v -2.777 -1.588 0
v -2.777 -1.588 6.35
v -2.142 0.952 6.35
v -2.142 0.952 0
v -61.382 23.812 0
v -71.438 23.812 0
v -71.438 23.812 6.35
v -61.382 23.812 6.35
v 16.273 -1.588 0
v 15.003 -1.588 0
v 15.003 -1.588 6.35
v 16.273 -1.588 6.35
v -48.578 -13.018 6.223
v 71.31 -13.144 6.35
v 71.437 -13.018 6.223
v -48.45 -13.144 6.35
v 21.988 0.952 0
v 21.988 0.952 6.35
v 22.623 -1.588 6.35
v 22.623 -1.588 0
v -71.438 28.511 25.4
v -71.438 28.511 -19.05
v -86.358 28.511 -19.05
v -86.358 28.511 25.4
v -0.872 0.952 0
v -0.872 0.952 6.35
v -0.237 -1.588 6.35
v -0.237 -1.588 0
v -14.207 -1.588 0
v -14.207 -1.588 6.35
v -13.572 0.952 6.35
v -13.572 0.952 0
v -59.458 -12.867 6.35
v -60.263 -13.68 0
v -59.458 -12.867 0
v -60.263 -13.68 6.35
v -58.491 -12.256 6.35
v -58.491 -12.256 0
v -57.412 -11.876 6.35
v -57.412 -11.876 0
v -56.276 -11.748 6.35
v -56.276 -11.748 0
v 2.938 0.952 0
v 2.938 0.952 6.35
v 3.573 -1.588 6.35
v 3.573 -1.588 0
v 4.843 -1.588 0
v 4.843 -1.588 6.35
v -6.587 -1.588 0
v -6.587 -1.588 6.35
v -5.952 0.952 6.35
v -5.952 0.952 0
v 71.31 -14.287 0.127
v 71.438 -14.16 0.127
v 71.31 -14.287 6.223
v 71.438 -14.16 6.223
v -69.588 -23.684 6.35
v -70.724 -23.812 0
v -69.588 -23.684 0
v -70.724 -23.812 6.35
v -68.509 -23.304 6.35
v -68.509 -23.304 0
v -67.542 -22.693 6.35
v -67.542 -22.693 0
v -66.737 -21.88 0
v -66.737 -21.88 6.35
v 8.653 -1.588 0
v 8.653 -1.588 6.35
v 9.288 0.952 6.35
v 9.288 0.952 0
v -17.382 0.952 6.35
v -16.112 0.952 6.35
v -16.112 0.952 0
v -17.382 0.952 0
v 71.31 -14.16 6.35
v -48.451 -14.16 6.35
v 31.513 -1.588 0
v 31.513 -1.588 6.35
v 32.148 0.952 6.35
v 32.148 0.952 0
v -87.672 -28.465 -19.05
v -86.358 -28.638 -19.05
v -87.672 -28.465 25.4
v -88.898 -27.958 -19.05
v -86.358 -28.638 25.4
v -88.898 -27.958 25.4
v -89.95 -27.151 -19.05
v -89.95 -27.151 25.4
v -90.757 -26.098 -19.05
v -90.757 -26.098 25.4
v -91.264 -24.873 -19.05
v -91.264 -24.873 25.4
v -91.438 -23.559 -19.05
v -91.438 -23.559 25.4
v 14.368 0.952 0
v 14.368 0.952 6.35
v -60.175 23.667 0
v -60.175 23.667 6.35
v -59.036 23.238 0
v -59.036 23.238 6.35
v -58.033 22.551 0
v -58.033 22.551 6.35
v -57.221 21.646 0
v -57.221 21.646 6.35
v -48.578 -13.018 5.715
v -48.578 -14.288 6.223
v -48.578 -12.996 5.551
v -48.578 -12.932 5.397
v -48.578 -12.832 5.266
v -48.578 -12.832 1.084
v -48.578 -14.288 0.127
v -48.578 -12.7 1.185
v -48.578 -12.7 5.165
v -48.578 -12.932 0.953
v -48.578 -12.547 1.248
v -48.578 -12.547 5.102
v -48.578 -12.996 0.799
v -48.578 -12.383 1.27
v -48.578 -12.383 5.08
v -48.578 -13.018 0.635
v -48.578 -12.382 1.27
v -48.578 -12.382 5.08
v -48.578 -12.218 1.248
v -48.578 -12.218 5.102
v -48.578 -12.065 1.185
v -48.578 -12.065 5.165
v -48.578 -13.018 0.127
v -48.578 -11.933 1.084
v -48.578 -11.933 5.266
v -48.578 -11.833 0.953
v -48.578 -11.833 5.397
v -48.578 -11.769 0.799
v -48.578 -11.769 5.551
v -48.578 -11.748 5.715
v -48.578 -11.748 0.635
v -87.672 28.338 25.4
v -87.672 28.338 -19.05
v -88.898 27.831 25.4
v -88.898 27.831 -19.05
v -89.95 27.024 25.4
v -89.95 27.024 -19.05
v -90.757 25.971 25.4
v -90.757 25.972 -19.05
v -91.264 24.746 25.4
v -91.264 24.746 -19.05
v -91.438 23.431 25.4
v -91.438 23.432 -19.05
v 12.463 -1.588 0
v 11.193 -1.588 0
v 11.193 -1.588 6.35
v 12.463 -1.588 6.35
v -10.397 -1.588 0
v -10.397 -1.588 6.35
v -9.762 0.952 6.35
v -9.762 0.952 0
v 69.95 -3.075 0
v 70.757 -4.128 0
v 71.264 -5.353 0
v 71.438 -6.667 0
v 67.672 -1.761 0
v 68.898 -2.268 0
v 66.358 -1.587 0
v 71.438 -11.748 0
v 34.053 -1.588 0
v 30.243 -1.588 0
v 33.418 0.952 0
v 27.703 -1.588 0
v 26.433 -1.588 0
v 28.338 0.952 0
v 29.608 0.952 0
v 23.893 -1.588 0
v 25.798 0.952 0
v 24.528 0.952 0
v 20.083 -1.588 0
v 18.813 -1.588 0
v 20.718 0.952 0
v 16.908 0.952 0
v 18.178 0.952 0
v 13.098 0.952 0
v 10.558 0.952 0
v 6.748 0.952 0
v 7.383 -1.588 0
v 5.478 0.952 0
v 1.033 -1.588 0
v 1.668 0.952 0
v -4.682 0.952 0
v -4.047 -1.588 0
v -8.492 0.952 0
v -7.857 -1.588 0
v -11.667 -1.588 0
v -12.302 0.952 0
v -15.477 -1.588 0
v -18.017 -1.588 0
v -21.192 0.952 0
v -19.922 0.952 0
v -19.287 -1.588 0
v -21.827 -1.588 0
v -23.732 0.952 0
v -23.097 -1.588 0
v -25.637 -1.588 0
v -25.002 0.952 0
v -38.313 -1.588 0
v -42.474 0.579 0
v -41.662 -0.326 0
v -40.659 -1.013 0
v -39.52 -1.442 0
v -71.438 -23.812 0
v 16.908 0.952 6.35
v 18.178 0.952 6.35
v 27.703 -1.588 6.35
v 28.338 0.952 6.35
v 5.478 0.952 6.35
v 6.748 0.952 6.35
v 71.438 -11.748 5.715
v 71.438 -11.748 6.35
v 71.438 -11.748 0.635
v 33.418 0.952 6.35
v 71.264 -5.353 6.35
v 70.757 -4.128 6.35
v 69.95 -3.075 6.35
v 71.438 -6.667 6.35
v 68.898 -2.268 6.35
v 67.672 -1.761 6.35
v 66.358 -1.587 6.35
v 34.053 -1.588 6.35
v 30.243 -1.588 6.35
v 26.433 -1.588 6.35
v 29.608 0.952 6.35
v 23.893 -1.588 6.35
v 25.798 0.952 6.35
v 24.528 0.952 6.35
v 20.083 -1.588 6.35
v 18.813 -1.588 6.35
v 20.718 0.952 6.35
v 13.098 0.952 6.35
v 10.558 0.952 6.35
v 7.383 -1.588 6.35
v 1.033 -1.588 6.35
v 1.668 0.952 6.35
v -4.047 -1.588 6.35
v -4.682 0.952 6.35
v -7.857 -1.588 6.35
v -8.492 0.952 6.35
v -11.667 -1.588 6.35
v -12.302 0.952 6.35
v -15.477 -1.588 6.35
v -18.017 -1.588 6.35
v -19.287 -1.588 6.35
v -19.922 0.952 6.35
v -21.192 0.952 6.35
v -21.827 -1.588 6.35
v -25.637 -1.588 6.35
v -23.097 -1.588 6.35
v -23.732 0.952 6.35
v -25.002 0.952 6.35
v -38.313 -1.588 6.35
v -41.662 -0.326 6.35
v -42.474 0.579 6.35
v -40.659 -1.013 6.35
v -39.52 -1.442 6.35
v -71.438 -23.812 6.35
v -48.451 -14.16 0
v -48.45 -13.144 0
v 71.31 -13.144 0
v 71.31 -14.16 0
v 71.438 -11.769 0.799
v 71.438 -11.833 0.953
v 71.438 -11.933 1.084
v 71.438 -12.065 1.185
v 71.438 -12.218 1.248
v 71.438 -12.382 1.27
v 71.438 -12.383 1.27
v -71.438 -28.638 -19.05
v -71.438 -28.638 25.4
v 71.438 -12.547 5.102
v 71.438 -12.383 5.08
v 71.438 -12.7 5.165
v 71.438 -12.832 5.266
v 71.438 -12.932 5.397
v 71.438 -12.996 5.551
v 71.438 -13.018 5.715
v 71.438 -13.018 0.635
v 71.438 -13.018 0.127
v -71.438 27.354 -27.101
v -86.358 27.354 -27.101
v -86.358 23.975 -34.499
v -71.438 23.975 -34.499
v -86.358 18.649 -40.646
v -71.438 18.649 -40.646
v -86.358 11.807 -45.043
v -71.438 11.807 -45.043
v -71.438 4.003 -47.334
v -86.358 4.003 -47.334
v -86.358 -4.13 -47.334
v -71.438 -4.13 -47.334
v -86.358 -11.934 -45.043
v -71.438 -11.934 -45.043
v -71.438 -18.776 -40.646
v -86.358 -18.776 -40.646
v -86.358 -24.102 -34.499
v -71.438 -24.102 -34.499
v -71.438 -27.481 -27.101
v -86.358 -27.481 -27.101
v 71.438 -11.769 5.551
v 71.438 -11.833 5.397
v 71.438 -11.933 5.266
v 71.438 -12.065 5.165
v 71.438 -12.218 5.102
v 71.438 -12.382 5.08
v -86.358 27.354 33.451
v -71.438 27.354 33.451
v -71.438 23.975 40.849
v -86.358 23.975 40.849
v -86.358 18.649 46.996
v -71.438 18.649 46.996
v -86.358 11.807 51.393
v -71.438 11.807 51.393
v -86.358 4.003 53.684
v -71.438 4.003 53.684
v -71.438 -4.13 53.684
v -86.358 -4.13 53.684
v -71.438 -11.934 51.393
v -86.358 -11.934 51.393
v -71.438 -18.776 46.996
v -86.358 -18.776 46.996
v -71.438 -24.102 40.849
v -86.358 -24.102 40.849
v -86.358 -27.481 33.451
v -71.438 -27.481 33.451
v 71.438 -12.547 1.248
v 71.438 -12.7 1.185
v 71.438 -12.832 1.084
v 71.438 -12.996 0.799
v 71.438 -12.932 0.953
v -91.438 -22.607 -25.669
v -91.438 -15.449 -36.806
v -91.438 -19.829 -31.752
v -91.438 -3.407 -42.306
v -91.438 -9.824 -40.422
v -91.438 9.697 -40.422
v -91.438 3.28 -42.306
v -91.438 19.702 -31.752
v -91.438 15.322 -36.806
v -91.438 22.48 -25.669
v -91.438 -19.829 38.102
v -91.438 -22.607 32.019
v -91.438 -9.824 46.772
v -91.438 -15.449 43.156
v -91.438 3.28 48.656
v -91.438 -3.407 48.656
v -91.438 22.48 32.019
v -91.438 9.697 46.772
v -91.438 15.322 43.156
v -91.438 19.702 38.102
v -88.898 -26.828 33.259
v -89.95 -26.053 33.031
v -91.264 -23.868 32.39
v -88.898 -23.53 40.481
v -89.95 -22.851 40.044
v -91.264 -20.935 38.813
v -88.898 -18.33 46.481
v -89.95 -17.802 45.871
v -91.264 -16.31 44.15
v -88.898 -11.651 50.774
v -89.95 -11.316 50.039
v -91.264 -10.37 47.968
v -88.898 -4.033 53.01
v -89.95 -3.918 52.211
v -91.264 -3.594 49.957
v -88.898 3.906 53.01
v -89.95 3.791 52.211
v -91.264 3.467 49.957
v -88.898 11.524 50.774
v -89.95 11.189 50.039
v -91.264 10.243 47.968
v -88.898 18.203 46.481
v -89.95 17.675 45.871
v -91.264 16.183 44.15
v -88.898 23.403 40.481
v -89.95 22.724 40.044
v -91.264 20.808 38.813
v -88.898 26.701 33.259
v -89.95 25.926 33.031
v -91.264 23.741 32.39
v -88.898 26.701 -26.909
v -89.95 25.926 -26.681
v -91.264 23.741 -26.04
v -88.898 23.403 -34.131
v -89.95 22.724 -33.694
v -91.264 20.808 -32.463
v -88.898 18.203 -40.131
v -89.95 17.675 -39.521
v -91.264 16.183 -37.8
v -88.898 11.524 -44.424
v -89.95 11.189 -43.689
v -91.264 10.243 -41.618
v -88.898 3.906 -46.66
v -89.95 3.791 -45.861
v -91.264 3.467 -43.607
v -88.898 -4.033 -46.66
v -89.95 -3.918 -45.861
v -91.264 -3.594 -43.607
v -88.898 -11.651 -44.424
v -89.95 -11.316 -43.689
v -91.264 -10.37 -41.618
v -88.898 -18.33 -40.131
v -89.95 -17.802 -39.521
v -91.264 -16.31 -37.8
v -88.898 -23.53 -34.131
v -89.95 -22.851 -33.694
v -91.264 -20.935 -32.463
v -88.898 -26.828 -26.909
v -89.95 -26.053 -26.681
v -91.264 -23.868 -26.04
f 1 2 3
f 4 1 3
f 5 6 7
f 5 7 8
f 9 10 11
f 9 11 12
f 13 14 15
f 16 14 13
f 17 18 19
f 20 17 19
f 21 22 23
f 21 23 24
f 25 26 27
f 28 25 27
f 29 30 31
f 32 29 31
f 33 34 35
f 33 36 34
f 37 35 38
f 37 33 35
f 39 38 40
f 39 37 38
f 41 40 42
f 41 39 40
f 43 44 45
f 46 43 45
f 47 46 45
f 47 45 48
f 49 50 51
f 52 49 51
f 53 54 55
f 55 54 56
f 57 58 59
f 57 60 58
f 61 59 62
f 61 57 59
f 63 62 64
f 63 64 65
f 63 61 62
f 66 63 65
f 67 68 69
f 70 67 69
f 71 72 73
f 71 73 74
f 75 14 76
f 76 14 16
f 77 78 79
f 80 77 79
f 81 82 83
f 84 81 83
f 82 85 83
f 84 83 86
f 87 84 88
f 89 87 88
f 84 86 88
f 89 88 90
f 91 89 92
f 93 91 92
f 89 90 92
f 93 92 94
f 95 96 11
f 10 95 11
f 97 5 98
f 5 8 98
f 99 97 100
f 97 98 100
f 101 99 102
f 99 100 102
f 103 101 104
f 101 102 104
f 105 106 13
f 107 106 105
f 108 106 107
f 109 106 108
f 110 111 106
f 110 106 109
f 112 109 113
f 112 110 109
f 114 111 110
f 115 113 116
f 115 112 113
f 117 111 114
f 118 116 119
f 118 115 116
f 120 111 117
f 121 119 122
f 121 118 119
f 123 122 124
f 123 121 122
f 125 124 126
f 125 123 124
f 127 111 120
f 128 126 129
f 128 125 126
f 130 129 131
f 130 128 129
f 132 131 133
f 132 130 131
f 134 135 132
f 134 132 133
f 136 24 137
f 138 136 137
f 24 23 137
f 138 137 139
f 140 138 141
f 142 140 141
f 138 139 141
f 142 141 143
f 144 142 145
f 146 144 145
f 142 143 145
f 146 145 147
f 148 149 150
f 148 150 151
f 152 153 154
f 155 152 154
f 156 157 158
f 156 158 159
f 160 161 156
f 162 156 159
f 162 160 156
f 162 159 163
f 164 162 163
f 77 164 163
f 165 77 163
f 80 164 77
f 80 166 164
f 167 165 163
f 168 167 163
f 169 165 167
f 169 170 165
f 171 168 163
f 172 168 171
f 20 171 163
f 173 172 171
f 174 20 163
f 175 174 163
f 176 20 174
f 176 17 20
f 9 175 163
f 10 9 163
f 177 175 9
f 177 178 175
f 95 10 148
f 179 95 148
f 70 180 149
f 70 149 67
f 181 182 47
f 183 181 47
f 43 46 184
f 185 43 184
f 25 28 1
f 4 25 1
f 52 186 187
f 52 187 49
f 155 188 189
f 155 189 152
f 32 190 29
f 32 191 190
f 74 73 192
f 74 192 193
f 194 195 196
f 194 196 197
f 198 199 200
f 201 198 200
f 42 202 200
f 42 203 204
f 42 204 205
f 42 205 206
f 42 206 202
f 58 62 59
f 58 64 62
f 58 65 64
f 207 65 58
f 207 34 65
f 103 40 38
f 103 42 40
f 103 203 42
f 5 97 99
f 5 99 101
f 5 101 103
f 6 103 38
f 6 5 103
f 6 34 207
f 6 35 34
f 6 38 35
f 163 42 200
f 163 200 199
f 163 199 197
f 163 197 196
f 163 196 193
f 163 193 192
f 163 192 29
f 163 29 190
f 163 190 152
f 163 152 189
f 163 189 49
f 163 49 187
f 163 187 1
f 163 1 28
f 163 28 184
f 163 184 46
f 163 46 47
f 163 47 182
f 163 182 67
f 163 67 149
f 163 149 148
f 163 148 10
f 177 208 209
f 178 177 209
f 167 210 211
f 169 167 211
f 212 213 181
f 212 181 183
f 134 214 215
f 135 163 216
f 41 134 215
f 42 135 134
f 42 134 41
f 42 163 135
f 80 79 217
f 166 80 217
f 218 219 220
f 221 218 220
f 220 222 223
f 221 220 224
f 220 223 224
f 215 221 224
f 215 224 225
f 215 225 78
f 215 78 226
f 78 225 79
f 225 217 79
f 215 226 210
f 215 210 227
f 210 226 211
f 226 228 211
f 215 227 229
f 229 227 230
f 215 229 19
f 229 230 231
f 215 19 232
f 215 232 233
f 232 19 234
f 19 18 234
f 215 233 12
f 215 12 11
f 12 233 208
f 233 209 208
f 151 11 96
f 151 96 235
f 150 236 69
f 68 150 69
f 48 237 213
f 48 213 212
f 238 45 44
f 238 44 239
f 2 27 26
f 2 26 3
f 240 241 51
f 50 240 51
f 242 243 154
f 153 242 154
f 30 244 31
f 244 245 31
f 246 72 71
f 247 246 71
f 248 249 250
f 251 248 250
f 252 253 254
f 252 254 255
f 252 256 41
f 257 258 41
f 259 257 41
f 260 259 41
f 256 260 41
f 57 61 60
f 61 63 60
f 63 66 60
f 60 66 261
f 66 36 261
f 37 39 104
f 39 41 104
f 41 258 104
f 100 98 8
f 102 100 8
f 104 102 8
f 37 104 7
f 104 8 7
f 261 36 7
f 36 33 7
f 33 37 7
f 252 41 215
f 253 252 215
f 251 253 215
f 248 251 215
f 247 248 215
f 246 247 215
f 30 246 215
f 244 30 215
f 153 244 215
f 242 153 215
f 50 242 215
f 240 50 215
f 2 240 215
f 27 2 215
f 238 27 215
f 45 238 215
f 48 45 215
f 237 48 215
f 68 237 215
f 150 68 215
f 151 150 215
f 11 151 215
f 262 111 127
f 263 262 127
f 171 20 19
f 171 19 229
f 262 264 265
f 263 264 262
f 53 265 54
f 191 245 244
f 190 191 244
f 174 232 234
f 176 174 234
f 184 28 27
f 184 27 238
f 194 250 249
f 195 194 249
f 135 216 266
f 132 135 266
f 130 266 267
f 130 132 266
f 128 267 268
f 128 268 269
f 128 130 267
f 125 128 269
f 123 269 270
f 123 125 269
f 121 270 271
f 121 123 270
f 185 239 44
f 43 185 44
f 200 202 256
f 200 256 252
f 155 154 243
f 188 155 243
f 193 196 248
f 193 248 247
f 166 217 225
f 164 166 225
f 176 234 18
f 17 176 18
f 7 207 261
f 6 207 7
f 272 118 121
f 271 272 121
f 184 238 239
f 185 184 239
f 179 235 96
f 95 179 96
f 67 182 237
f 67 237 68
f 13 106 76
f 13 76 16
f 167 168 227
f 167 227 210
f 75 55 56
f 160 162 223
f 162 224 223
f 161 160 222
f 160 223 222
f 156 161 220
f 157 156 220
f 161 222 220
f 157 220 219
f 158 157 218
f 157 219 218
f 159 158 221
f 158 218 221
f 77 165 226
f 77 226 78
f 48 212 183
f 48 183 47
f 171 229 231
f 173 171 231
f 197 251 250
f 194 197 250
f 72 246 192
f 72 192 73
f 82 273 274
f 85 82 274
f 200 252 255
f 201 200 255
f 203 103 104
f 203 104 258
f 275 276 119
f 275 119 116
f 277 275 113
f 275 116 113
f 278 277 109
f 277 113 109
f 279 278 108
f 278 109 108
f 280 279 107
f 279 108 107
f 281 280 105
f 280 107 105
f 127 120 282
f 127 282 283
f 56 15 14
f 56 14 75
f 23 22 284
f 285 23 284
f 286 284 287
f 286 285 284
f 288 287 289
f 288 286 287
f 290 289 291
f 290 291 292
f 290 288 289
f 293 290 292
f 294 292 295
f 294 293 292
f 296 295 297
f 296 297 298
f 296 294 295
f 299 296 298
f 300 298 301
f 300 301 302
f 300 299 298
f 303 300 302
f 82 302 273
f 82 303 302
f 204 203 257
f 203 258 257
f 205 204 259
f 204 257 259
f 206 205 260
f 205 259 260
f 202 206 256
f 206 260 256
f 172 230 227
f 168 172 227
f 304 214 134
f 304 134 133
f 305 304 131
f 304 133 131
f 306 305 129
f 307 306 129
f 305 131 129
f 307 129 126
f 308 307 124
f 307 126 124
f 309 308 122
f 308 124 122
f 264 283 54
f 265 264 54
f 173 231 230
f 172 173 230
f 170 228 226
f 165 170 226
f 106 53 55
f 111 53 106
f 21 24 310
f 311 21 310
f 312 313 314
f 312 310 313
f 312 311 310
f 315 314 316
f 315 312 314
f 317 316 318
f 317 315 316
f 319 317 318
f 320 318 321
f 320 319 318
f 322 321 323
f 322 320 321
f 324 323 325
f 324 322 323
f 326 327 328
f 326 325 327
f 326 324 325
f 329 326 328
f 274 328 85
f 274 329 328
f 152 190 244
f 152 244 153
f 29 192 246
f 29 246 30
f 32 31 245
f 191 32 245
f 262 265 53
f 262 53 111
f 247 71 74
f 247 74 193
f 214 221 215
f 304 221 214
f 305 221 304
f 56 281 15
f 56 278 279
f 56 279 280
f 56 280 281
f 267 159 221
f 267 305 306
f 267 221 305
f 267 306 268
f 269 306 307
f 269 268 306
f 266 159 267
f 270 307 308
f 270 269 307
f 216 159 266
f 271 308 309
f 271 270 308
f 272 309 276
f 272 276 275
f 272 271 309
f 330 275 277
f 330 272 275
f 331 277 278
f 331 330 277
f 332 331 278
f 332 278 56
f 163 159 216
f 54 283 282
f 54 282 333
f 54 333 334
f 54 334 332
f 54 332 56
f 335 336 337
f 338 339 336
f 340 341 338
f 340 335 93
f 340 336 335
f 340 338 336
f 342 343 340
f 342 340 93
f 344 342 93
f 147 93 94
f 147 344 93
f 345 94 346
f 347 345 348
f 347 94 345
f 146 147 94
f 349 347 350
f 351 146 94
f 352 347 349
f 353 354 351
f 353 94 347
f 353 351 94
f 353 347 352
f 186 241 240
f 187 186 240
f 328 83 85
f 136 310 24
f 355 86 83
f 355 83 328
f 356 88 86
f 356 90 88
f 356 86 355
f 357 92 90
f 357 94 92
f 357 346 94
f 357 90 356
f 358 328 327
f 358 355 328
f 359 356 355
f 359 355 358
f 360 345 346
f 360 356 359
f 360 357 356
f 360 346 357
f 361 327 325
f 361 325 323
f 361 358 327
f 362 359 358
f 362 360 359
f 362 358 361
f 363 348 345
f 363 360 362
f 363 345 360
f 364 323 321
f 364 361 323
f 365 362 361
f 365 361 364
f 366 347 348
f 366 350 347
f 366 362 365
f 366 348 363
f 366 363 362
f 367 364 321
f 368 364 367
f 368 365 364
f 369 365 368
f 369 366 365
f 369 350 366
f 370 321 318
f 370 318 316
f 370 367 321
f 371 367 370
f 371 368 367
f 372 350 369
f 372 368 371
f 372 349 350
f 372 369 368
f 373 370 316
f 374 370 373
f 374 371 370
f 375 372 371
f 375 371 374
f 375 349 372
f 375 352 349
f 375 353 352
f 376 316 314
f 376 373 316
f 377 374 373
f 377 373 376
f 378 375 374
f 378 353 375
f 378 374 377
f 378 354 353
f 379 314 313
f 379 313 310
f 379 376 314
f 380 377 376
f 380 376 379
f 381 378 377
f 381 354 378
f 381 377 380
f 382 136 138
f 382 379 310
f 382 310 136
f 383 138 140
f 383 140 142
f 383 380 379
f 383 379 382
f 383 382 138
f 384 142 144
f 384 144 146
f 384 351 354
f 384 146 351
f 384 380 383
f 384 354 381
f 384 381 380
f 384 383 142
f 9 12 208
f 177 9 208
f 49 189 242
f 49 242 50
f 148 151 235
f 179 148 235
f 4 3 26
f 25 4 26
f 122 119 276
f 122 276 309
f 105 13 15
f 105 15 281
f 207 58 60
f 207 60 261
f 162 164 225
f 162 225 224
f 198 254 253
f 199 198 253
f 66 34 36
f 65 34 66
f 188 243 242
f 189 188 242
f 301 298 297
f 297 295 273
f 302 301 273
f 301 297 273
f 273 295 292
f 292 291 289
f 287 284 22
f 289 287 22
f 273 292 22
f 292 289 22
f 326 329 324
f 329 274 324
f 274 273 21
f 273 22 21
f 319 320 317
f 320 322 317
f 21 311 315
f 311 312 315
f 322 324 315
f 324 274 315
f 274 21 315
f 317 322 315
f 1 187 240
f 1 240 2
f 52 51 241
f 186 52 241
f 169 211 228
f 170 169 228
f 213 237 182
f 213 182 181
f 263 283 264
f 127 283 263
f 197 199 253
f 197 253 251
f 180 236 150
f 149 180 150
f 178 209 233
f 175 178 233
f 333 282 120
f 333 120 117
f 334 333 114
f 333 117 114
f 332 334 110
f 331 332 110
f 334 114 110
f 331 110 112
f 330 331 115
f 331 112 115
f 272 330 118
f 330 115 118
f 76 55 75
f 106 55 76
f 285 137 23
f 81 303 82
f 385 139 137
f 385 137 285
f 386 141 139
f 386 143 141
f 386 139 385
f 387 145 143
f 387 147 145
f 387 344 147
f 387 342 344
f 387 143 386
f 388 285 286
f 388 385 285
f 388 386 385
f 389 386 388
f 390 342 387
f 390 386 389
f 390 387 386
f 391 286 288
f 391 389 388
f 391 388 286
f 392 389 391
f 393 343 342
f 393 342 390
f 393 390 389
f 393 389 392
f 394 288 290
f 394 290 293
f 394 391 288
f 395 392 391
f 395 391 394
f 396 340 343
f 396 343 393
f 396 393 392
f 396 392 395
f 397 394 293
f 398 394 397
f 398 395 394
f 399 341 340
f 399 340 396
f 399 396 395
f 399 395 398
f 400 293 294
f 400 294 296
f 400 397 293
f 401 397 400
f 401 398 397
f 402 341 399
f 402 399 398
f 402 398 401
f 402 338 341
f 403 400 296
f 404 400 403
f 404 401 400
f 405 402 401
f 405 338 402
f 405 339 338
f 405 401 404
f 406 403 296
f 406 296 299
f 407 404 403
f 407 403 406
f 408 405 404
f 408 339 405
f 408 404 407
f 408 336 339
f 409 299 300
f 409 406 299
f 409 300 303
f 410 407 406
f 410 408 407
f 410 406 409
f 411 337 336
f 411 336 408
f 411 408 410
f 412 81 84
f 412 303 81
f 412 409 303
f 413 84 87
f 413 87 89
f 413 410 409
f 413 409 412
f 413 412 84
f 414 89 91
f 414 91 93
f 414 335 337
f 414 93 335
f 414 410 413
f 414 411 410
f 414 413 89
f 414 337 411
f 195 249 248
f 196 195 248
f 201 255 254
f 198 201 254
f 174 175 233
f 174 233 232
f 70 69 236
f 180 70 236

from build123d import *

# Parameters (mm, degrees)
BOSS_EXTRUDE1_DEPTH = 6.35
FILLET1_R           = 5.08
FILLET2_R           = 5.08
FILLET3_R           = 5.08
SKETCH2_W           = 1.27
SKETCH2_H           = 1.27
CUT_EXTRUDE1_DEPTH  = 120.015
FILLET5_R           = 0.635
FILLET6_R           = 0.635
CHAMFER1_SIZE       = 0.127
BOSS_EXTRUDE2_DEPTH = 6.35
SKETCH4_W           = 101.6
SKETCH4_H           = 57.15
BOSS_EXTRUDE3_DEPTH = 20
FILLET7_RADIUS      = 28.575
FILLET7_LENGTH      = 20
FILLET8_RADIUS      = 28.575
FILLET8_LENGTH      = 20
FILLET9_R           = 5.08


with BuildPart() as part:
    # Sketch1 → Boss-Extrude1 (new body)
    with BuildSketch(Plane.XY):
        Polygon((-71.4375, 23.8125), (-58.7375, 23.8125), (-40.9575, -1.5875), (71.4375, -1.5875), (71.4375, -14.2875), (-48.5775, -14.2875), (-48.5775, -11.7475), (-58.7375, -11.7475), (-68.2625, -23.8125), (-71.4375, -23.8125), align=None)
    extrude(amount=BOSS_EXTRUDE1_DEPTH)

    # Fillet1
    fillet1_edges = [part.edges().sort_by_distance(p)[0] for p in [
        (-58.7375, 23.8125, 3.175),
    ]]
    fillet(fillet1_edges, radius=FILLET1_R)

    # Fillet2
    fillet2_edges = [part.edges().sort_by_distance(p)[0] for p in [
        (-40.9575, -1.5875, 3.175),
        (-58.7375, -11.7475, 3.175),
        (-68.2625, -23.8125, 3.175),
    ]]
    fillet(fillet2_edges, radius=FILLET2_R)

    # Fillet3
    fillet3_edges = [part.edges().sort_by_distance(p)[0] for p in [
        (71.4375, -1.5875, 3.175),
    ]]
    fillet(fillet3_edges, radius=FILLET3_R)

    # Sketch2 → Cut-Extrude1 (cut)
    with BuildSketch(Plane(origin=(71.4375, 0, 0), x_dir=(0, 0, -1), z_dir=(1, 0, 0))):
        with Locations((-5.715, -12.3825)):
            Rectangle(SKETCH2_W, SKETCH2_H)
        with Locations((-0.635, -12.3825)):
            Rectangle(SKETCH2_W, SKETCH2_H)
    extrude(amount=-CUT_EXTRUDE1_DEPTH, mode=Mode.SUBTRACT)

    # Fillet5
    fillet5_edges = [part.edges().sort_by_distance(p)[0] for p in [
        (11.43, -11.7475, 1.27),
        (11.43, -13.0175, 1.27),
    ]]
    fillet(fillet5_edges, radius=FILLET5_R - 0.0001)  # a hair under: the kernel refuses the full size

    # Fillet6
    fillet6_edges = [part.edges().sort_by_distance(p)[0] for p in [
        (11.43, -11.7475, 5.08),
        (11.43, -13.0175, 5.08),
    ]]
    fillet(fillet6_edges, radius=FILLET6_R - 0.0001)  # a hair under: the kernel refuses the full size

    # Chamfer1
    chamfer1_edges = [part.edges().sort_by_distance(p)[0] for p in [
        (71.4375, -13.6525, 0),
        (11.43, -14.2875, 0),
        (71.4375, -14.2875, 3.175),
        (11.43, -14.2875, 6.35),
        (71.4375, -13.6525, 6.35),
        (-48.5775, -13.6525, 0),
        (-48.5775, -13.6525, 6.35),
        (11.43, -13.0175, 6.35),
        (11.43, -13.0175, 0),
    ]]
    chamfer(chamfer1_edges, length=CHAMFER1_SIZE)

    # Sketch3 → Boss-Extrude2 (add)
    with BuildSketch(Plane.XY.offset(6.35)):
        Polygon((-18.01675216, -1.5875), (-15.47675216, -1.5875), (-16.11175216, 0.9525), (-17.38175216, 0.9525), align=None)
        Polygon((5.47824784, 0.9525), (4.84324784, -1.5875), (7.38324784, -1.5875), (6.74824784, 0.9525), align=None)
        Polygon((-25.63675216, -1.5875), (-25.00175216, 0.9525), (-23.73175216, 0.9525), (-23.09675216, -1.5875), align=None)
        Polygon((-21.82675216, -1.5875), (-21.19175216, 0.9525), (-19.92175216, 0.9525), (-19.28675216, -1.5875), align=None)
        Polygon((-12.30175216, 0.9525), (-11.66675216, -1.5875), (-14.20675216, -1.5875), (-13.57175216, 0.9525), align=None)
        Polygon((-8.49175216, 0.9525), (-7.85675216, -1.5875), (-10.39675216, -1.5875), (-9.76175216, 0.9525), align=None)
        Polygon((-4.68175216, 0.9525), (-4.04675216, -1.5875), (-6.58675216, -1.5875), (-5.95175216, 0.9525), align=None)
        Polygon((-2.77675216, -1.5875), (-2.14175216, 0.9525), (-0.87175216, 0.9525), (-0.23675216, -1.5875), align=None)
        Polygon((2.93824784, 0.9525), (3.57324784, -1.5875), (1.03324784, -1.5875), (1.66824784, 0.9525), align=None)
        Polygon((10.55824784, 0.9525), (11.19324784, -1.5875), (8.65324784, -1.5875), (9.28824784, 0.9525), align=None)
        Polygon((14.36824784, 0.9525), (15.00324784, -1.5875), (12.46324784, -1.5875), (13.09824784, 0.9525), align=None)
        Polygon((18.17824784, 0.9525), (18.81324784, -1.5875), (16.27324784, -1.5875), (16.90824784, 0.9525), align=None)
        Polygon((21.98824784, 0.9525), (22.62324784, -1.5875), (20.08324784, -1.5875), (20.71824784, 0.9525), align=None)
        Polygon((25.79824784, 0.9525), (26.43324784, -1.5875), (23.89324784, -1.5875), (24.52824784, 0.9525), align=None)
        Polygon((27.70324784, -1.5875), (28.33824784, 0.9525), (29.60824784, 0.9525), (30.24324784, -1.5875), align=None)
        Polygon((33.41824784, 0.9525), (34.05324784, -1.5875), (31.51324784, -1.5875), (32.14824784, 0.9525), align=None)
    extrude(amount=-BOSS_EXTRUDE2_DEPTH)


with BuildPart() as body_2:
    # Sketch4 → Boss-Extrude3 (new body)
    with BuildSketch(Plane.ZY.offset(71.4375)):
        with Locations((3.175, -0.0635)):
            Rectangle(SKETCH4_W, SKETCH4_H)
    extrude(amount=BOSS_EXTRUDE3_DEPTH)

    # Fillet7: full round fillet: the end face becomes a half cylinder, R = half its width
    fillet7_face = Plane((-81.4375, -0.0635, -47.625), x_dir=(-1, 0, 0), z_dir=(0, 0, -1))  # on the end face: x along it, z out of the body
    fillet7_slab = fillet7_face.offset(-FILLET7_RADIUS / 2) * Box(FILLET7_LENGTH, 2 * FILLET7_RADIUS, FILLET7_RADIUS, mode=Mode.PRIVATE)  # the body's end, R deep
    fillet7_round = Plane((-81.4375, -0.0635, -19.05), x_dir=(0, 0, -1), z_dir=(-1, 0, 0)) * Cylinder(FILLET7_RADIUS, FILLET7_LENGTH, mode=Mode.PRIVATE)  # its axis R under the face
    add(fillet7_slab - fillet7_round, mode=Mode.SUBTRACT)

    # Fillet8: full round fillet: the end face becomes a half cylinder, R = half its width
    fillet8_face = Plane((-81.4375, -0.0635, 53.975), x_dir=(1, 0, 0), z_dir=(0, 0, 1))  # on the end face: x along it, z out of the body
    fillet8_slab = fillet8_face.offset(-FILLET8_RADIUS / 2) * Box(FILLET8_LENGTH, 2 * FILLET8_RADIUS, FILLET8_RADIUS, mode=Mode.PRIVATE)  # the body's end, R deep
    fillet8_round = Plane((-81.4375, -0.0635, 25.4), x_dir=(0, 0, 1), z_dir=(1, 0, 0)) * Cylinder(FILLET8_RADIUS, FILLET8_LENGTH, mode=Mode.PRIVATE)  # its axis R under the face
    add(fillet8_slab - fillet8_round, mode=Mode.SUBTRACT)

    # Fillet9
    fillet9_edges = [body_2.edges().sort_by_distance(p)[0] for p in [
        (-91.4375, -28.6385, 3.175),
        (-91.4375, -0.0635, -47.625),
        (-91.4375, 28.5115, 3.175),
        (-91.4375, -0.0635, 53.975),
    ]]
    fillet(fillet9_edges, radius=FILLET9_R)


solid = Compound([part.part, body_2.part])
